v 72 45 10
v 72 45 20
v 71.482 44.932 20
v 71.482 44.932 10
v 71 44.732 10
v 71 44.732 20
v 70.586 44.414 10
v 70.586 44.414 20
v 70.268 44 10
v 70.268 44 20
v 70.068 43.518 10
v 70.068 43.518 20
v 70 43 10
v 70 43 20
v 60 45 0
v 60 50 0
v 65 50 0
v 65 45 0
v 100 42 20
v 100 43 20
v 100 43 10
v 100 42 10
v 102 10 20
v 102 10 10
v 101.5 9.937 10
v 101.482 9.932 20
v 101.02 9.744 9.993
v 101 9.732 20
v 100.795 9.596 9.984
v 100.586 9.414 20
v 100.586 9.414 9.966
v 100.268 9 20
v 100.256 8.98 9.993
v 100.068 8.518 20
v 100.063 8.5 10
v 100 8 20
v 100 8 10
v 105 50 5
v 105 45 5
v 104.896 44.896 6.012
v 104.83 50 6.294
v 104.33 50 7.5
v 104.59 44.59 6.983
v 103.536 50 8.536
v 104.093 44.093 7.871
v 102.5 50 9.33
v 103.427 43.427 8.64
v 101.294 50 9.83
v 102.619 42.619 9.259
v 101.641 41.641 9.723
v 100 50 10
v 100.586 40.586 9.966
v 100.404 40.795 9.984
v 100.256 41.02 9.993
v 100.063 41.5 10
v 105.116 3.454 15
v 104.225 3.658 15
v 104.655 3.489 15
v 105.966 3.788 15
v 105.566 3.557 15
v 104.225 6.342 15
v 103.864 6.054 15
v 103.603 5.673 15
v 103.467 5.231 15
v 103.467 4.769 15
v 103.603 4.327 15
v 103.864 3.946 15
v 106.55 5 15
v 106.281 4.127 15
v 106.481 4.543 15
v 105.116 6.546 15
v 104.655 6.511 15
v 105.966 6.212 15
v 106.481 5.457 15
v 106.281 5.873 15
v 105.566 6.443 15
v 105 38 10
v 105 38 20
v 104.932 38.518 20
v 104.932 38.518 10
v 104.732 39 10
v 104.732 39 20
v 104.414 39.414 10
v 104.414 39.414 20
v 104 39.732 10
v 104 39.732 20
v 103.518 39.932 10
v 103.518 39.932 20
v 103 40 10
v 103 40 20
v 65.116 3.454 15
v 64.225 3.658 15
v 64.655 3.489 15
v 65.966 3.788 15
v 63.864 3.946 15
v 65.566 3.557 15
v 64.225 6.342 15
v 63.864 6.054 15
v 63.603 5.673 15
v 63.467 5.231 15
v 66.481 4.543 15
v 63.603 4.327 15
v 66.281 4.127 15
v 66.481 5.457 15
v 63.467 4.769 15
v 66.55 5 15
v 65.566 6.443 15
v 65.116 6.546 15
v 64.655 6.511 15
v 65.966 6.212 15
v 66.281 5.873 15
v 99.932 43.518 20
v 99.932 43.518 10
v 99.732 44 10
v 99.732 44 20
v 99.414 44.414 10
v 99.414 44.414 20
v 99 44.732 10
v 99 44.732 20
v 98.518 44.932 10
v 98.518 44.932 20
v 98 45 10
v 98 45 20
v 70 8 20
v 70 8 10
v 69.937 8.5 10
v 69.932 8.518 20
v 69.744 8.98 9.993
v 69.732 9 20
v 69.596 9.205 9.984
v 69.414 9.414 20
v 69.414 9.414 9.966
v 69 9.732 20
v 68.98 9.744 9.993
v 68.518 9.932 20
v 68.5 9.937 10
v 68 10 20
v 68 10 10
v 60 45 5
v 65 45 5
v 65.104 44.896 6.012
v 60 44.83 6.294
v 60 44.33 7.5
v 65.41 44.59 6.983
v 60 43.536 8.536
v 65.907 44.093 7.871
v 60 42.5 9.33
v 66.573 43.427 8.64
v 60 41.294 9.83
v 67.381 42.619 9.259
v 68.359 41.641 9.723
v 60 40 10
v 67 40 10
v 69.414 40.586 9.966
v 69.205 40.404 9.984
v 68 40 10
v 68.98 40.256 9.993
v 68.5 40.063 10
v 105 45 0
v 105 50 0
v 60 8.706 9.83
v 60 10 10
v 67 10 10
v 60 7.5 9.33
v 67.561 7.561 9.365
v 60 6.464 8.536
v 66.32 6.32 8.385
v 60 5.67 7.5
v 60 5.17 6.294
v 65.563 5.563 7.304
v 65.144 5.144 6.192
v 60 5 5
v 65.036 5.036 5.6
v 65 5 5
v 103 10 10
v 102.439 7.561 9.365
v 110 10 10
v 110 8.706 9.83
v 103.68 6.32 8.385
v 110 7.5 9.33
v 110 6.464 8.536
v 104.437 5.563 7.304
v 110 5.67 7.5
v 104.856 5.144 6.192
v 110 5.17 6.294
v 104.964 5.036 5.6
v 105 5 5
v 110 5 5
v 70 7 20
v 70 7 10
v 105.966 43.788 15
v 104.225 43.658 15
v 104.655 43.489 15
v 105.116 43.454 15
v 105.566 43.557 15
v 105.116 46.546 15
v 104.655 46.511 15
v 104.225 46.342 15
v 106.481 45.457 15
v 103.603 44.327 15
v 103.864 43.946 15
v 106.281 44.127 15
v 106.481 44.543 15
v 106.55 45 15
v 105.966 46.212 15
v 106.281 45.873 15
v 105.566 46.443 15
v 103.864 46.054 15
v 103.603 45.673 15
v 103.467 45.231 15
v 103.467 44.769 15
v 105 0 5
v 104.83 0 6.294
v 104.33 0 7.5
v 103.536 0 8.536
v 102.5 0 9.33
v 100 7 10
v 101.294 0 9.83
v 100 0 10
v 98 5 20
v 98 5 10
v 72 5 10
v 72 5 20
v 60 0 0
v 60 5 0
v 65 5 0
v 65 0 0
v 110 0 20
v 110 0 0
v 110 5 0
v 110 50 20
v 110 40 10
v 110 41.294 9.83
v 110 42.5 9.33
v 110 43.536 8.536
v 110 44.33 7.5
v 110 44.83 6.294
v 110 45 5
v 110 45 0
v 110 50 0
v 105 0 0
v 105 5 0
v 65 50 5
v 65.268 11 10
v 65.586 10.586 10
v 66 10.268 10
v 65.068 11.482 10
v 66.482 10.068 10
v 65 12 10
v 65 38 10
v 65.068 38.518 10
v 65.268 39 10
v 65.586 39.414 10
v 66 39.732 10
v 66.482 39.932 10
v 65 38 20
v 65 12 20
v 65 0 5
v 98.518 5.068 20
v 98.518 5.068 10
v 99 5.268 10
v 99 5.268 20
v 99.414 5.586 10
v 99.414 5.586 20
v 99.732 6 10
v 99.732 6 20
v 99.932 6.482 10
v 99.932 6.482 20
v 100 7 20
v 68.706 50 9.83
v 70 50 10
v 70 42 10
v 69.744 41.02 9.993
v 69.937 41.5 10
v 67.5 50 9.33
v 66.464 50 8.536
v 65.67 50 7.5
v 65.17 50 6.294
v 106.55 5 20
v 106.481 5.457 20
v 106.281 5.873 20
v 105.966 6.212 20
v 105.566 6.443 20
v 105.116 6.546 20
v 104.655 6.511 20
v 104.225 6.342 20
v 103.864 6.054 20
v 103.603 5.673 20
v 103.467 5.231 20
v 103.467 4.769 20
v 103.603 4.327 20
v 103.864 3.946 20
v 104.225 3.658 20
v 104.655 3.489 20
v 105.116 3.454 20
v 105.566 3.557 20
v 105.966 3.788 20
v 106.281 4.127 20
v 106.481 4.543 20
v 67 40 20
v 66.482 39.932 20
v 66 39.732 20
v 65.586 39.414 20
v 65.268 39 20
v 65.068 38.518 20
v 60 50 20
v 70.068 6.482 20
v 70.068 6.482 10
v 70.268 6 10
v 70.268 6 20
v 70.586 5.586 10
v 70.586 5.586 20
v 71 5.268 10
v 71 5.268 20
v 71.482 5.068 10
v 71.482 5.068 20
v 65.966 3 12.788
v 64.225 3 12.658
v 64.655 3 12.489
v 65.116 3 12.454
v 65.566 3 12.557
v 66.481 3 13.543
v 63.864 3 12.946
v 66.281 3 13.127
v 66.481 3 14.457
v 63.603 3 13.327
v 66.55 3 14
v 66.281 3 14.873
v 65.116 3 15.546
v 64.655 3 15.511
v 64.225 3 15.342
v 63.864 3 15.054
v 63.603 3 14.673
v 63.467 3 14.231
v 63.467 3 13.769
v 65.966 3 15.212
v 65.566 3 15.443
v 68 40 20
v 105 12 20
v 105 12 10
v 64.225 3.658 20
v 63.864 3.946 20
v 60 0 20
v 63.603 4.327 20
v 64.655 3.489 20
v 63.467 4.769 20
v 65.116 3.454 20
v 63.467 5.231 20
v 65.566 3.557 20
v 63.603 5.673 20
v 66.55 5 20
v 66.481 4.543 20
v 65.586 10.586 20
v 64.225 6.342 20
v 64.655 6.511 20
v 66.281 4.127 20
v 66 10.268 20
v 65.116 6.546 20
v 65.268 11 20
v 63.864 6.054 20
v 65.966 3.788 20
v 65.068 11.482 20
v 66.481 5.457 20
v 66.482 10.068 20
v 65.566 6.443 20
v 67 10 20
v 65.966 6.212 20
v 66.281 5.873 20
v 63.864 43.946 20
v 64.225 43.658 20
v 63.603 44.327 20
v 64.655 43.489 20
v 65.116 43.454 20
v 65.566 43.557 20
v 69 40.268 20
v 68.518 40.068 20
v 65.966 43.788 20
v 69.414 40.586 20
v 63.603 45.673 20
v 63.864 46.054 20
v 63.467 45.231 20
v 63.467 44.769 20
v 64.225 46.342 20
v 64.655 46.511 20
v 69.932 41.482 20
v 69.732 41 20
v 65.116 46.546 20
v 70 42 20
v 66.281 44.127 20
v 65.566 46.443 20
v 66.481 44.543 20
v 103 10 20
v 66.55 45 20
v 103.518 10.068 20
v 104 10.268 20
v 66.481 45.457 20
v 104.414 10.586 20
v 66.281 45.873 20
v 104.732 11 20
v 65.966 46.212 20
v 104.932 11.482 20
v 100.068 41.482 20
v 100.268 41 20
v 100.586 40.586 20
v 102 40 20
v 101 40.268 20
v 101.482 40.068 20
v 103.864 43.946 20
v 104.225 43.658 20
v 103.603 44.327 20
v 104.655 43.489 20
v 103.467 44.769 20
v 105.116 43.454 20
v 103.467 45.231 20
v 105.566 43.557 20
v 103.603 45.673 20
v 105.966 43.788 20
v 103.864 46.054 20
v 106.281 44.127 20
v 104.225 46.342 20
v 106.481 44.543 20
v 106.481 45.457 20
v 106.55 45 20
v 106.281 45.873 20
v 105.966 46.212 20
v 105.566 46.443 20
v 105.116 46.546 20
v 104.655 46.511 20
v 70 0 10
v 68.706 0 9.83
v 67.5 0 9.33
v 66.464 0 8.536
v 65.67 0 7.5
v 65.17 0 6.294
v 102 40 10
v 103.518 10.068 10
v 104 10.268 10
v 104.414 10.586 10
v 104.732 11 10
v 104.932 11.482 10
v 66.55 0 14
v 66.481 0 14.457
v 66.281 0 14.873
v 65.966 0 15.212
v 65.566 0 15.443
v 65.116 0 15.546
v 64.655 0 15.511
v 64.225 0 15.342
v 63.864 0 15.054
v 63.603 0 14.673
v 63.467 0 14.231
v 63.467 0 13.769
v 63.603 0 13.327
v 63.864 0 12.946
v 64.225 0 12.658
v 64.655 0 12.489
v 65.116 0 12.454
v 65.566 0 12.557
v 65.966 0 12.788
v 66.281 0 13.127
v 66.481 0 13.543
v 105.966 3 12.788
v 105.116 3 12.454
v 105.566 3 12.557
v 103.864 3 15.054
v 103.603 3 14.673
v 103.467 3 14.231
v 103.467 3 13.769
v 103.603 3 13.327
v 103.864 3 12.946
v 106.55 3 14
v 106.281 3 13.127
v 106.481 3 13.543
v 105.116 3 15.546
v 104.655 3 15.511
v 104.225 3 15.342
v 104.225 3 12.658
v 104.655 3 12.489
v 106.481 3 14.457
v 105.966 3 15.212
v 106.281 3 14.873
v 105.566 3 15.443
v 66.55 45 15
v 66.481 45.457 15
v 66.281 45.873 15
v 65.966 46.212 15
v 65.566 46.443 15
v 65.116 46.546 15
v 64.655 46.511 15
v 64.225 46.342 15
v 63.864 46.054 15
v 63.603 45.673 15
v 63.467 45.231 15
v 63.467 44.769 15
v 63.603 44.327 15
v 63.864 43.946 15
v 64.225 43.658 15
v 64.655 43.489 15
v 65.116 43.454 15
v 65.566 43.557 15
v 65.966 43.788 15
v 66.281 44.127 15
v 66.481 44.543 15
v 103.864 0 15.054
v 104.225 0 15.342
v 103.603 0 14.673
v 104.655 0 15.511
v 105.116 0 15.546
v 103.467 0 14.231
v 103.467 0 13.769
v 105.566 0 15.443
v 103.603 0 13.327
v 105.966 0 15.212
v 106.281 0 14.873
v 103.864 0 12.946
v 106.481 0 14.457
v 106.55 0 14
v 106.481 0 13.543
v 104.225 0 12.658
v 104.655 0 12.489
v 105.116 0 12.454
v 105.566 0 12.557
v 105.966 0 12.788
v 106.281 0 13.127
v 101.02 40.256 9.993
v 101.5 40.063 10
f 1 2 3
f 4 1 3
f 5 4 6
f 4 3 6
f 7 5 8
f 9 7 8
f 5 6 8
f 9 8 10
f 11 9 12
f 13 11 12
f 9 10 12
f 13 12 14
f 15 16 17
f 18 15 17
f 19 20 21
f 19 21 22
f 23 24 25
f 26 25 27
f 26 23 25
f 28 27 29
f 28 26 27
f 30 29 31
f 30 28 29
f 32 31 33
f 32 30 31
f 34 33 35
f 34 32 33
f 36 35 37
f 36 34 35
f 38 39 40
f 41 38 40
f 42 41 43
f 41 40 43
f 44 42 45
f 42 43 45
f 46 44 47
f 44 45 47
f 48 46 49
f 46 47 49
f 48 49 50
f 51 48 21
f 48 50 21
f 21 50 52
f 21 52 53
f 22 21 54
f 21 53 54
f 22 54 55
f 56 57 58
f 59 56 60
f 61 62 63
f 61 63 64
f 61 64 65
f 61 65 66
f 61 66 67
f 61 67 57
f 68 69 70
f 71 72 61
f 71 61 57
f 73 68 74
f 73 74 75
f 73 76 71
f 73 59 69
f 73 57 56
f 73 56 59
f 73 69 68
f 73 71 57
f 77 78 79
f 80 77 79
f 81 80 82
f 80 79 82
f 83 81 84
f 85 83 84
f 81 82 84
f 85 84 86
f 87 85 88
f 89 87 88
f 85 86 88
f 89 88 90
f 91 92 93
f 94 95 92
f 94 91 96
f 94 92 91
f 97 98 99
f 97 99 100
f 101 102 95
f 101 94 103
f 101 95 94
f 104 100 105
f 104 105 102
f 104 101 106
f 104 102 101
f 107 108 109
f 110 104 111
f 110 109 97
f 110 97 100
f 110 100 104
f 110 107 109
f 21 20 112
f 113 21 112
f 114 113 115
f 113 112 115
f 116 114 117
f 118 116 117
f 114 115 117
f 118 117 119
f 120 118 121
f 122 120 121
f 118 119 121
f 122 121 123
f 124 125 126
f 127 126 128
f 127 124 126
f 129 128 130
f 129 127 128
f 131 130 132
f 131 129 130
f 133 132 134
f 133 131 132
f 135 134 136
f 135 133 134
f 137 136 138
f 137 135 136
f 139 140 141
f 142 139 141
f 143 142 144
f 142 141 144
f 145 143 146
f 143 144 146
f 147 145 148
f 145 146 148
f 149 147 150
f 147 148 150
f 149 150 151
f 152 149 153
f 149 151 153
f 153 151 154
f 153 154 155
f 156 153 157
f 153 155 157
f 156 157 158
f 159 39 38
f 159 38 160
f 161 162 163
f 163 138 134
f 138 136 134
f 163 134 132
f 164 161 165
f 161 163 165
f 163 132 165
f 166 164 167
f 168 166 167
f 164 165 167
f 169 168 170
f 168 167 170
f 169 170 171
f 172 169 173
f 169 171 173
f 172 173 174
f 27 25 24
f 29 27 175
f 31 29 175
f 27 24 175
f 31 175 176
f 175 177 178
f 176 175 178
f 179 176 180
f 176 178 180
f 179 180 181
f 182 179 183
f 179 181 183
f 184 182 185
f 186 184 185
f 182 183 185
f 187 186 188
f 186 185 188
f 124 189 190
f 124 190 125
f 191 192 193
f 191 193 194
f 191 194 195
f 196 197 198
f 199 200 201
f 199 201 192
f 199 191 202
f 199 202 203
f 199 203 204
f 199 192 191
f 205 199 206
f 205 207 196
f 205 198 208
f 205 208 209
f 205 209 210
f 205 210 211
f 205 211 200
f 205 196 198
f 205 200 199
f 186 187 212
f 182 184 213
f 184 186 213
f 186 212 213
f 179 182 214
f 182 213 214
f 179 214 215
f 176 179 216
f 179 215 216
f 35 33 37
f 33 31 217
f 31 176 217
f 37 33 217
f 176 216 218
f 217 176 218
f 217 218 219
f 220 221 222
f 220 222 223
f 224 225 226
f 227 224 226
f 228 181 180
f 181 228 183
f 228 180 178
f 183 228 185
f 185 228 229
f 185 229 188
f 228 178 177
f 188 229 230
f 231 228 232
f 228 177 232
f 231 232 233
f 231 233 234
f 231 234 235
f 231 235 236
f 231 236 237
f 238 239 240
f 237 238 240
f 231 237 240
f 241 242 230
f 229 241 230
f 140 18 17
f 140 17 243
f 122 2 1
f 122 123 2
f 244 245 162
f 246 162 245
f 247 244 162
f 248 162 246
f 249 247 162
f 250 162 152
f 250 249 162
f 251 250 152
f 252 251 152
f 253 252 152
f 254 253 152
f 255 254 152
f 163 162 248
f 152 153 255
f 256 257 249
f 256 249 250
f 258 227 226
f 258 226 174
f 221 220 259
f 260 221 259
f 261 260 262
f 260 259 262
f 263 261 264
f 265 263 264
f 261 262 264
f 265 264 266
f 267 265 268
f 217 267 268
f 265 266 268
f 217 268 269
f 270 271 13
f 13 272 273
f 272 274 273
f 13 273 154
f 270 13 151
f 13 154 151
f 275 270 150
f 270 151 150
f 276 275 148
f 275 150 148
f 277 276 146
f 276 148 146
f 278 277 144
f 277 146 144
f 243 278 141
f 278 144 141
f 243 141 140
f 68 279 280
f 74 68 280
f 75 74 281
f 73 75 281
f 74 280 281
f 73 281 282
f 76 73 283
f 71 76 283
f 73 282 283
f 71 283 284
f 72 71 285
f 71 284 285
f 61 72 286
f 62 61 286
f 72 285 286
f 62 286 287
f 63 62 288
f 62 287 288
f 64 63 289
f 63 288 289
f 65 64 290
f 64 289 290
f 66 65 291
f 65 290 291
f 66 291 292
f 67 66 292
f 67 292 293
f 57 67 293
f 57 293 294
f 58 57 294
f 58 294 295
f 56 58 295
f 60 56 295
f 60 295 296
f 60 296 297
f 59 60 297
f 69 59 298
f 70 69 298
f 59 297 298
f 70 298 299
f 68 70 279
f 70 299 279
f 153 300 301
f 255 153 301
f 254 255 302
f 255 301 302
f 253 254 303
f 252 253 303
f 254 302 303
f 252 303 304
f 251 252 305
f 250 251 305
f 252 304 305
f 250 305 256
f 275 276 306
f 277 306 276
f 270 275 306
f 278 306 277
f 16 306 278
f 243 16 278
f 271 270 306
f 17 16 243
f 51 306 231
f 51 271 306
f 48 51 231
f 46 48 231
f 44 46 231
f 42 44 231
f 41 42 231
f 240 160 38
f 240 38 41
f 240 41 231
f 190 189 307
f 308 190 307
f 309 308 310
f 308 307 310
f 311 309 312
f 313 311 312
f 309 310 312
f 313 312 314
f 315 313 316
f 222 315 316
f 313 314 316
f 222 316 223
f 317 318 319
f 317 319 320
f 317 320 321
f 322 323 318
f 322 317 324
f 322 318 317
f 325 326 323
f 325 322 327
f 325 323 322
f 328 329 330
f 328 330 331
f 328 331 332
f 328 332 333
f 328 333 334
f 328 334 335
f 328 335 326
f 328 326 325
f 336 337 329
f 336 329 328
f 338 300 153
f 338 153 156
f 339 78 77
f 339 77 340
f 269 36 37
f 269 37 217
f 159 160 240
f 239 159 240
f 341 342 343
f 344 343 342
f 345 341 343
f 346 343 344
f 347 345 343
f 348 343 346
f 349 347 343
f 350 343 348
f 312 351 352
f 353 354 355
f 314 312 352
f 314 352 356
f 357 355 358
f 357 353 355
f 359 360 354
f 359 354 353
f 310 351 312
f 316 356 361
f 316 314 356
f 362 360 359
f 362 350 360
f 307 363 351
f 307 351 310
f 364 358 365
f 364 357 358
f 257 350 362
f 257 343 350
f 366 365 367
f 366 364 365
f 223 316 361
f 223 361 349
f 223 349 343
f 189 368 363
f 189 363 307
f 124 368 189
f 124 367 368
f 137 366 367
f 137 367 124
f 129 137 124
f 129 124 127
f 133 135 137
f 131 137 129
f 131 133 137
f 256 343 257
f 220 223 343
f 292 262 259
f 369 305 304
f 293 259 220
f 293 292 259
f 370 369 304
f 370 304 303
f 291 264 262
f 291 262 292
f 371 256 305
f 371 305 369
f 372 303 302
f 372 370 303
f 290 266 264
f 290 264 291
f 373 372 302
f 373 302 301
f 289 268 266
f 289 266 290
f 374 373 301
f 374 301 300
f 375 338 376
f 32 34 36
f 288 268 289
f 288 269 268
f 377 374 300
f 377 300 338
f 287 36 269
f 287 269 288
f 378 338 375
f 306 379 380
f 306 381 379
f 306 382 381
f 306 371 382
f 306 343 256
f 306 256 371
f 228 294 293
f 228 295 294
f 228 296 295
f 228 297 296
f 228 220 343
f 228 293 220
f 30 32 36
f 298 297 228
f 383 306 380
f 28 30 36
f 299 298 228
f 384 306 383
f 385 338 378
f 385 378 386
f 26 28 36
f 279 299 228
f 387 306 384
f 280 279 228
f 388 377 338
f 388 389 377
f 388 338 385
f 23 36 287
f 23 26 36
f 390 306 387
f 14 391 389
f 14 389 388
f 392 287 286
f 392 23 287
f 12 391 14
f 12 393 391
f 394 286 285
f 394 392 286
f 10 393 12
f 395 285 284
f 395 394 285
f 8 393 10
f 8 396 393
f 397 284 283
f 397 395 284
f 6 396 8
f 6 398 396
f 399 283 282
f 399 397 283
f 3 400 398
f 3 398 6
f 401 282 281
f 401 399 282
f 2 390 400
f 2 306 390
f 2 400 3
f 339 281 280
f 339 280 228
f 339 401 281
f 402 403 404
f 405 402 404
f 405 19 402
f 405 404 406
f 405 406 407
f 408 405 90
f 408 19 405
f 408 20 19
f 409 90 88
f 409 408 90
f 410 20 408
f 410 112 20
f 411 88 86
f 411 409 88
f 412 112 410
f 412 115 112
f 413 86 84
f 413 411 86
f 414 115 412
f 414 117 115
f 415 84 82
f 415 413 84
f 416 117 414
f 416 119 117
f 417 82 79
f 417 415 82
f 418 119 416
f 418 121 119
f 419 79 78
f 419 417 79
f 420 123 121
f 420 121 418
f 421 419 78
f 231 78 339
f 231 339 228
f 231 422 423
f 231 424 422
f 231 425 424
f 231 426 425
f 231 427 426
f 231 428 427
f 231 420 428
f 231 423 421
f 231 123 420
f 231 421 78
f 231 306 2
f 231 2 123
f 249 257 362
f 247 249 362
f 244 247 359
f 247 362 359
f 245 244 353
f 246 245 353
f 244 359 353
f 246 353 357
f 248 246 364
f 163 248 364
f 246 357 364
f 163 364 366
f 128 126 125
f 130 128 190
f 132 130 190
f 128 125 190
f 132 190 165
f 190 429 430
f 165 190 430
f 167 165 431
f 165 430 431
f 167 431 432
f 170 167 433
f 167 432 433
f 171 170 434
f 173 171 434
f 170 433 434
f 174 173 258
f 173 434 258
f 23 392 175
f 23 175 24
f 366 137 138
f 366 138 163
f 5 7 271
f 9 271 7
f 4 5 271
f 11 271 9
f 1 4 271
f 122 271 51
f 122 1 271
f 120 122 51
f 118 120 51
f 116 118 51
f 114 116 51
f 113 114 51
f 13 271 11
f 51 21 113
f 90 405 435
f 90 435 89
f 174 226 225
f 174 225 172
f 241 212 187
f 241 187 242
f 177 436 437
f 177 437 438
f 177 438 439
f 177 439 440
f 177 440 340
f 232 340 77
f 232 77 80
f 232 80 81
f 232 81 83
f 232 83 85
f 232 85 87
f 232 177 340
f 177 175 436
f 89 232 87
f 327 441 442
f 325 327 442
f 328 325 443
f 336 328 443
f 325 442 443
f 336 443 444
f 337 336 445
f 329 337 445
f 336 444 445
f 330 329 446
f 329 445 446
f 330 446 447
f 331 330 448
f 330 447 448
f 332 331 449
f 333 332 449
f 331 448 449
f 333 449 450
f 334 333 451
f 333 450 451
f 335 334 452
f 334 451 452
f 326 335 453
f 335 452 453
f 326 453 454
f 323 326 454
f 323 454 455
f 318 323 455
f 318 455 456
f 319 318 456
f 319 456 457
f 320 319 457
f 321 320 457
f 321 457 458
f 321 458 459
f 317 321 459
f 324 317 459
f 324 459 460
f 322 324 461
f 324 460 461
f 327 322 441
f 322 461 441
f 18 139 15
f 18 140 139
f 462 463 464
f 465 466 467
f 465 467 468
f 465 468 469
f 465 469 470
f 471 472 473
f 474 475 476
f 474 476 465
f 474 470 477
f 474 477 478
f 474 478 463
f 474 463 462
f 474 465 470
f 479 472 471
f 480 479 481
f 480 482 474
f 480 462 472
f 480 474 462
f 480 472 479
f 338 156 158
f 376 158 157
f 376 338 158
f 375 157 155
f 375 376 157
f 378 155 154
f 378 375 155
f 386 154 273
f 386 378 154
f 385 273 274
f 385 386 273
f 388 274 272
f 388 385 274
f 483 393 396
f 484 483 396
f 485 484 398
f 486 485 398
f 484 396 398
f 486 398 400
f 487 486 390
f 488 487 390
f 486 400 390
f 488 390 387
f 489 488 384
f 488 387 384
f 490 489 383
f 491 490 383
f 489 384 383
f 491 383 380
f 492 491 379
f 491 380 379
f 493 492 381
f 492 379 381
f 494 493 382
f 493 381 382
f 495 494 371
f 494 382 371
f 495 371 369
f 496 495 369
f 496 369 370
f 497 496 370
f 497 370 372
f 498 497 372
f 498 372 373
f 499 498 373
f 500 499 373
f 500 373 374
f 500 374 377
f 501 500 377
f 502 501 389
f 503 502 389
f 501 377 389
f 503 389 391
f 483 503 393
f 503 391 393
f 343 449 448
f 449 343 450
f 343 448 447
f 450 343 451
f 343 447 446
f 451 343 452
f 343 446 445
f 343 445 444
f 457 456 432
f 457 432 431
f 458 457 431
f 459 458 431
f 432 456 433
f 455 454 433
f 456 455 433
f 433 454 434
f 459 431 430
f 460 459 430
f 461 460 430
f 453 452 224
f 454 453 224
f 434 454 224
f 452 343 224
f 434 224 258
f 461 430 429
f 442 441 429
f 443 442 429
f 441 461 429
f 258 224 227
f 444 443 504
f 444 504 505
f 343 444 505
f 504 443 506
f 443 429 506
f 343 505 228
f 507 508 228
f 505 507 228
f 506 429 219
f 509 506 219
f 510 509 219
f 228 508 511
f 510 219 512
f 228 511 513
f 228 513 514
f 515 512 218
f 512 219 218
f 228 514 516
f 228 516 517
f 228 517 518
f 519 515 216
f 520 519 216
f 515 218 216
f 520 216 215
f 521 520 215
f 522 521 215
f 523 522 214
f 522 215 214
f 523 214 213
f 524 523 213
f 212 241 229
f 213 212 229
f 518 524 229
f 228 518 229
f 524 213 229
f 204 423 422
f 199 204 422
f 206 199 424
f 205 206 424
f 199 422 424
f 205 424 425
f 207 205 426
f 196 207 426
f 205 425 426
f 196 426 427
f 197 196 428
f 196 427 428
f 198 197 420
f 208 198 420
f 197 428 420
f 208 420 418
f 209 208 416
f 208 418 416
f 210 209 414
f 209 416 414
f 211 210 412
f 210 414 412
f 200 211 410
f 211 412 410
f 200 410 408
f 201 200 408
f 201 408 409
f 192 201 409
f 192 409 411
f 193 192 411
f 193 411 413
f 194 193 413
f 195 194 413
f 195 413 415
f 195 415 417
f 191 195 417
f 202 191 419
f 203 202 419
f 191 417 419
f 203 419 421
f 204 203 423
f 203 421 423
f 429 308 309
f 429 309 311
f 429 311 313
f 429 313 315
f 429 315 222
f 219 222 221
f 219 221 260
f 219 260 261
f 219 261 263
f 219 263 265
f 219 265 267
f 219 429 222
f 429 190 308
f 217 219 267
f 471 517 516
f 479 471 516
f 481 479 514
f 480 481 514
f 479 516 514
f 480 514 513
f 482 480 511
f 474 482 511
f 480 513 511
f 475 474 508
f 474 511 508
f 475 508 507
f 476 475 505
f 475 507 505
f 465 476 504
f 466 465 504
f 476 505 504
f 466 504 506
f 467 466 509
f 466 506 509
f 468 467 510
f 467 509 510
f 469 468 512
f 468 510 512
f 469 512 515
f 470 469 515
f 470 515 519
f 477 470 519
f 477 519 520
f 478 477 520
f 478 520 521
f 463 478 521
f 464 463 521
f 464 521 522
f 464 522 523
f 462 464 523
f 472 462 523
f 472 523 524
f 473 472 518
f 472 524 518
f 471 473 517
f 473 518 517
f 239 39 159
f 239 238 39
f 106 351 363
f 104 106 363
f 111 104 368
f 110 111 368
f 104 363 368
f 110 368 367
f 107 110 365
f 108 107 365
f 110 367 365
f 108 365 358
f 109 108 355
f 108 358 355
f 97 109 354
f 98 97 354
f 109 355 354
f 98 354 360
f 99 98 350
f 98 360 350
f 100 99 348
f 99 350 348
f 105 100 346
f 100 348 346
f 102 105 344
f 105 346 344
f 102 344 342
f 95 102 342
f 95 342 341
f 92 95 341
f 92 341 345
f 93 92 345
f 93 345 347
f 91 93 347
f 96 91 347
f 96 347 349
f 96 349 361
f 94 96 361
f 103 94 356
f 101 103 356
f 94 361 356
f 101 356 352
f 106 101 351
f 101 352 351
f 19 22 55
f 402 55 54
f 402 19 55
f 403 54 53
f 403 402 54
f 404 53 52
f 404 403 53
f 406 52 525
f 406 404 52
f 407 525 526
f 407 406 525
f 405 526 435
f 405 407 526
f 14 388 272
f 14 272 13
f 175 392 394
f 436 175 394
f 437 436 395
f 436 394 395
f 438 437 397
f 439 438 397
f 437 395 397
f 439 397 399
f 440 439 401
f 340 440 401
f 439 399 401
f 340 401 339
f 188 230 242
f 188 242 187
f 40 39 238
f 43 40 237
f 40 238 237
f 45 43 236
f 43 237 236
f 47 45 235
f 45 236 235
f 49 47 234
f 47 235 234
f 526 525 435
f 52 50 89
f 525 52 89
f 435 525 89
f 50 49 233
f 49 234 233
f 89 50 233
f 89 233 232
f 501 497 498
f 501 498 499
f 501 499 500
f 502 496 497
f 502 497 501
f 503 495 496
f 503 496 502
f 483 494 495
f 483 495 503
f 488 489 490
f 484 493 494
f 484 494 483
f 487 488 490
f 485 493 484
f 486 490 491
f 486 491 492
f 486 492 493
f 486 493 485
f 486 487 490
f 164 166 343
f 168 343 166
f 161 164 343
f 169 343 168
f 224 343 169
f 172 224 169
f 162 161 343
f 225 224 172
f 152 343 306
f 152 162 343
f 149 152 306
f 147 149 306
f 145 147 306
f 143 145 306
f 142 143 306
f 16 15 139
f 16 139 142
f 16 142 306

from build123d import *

# Parameters (mm, degrees)
SKETCH152_W     = 50
SKETCH152_H     = 50
PAD026_DEPTH    = 20
POCKET127_DEPTH = 20.001
POCKET128_DEPTH = 50.001
POCKET129_DEPTH = 50.001
SKETCH156_R     = 1.55
POCKET130_DEPTH = 5
SKETCH157_R     = 1.55
POCKET131_DEPTH = 3


with BuildPart() as part:
    # Sketch152 → Pad026 (new body)
    with BuildSketch(Plane.XY):
        Rectangle(SKETCH152_W, SKETCH152_H)
    extrude(amount=PAD026_DEPTH)

    # Sketch153 (on Face6 of Pad026) → Pocket127 (cut, through all)
    with BuildSketch(Plane.XY.offset(20)):
        with BuildLine():
            Line((-18, 15), (-17, 15))
            ThreePointArc((-17, 15), (-15.585786, 15.585786), (-15, 17))
            Line((-15, 17), (-15, 18))
            ThreePointArc((-13, 20), (-14.414214, 19.414214), (-15, 18))
            Line((-13, 20), (13, 20))
            ThreePointArc((15, 18), (14.414214, 19.414214), (13, 20))
            Line((15, 18), (15, 17))
            ThreePointArc((15, 17), (15.585786, 15.585786), (17, 15))
            Line((17, 15), (18, 15))
            ThreePointArc((20, 13), (19.414214, 14.414214), (18, 15))
            Line((20, 13), (20, -13))
            ThreePointArc((18, -15), (19.414214, -14.414214), (20, -13))
            Line((18, -15), (17, -15))
            ThreePointArc((17, -15), (15.585786, -15.585786), (15, -17))
            Line((15, -17), (15, -18))
            ThreePointArc((13, -20), (14.414214, -19.414214), (15, -18))
            Line((13, -20), (-13, -20))
            ThreePointArc((-15, -18), (-14.414214, -19.414214), (-13, -20))
            Line((-15, -18), (-15, -17))
            ThreePointArc((-15, -17), (-15.585786, -15.585786), (-17, -15))
            Line((-17, -15), (-18, -15))
            ThreePointArc((-20, -13), (-19.414214, -14.414214), (-18, -15))
            Line((-20, -13), (-20, 13))
            ThreePointArc((-18, 15), (-19.414214, 14.414214), (-20, 13))
        make_face()
    extrude(amount=-POCKET127_DEPTH, mode=Mode.SUBTRACT)

    # Sketch154 (on Face3 of Pocket127) → Pocket128 (cut, through all)
    with BuildSketch(Plane.YZ.offset(25)):
        with BuildLine():
            Line((-15, 10), (15, 10))
            ThreePointArc((20, 5), (18.535534, 8.535534), (15, 10))
            Line((20, 5), (20, 0))
            Line((20, 0), (-20, 0))
            Line((-20, 0), (-20, 5))
            ThreePointArc((-15, 10), (-18.535534, 8.535534), (-20, 5))
        make_face()
    extrude(amount=-POCKET128_DEPTH, mode=Mode.SUBTRACT)

    # Sketch155 (on Face6 of Pocket127) → Pocket129 (cut, through all)
    with BuildSketch(Plane.XZ.offset(25)):
        with BuildLine():
            Line((-15, 10), (15, 10))
            ThreePointArc((20, 5), (18.535534, 8.535534), (15, 10))
            Line((20, 5), (20, 0))
            Line((20, 0), (-20, 0))
            Line((-20, 0), (-20, 5))
            ThreePointArc((-15, 10), (-18.535534, 8.535534), (-20, 5))
        make_face()
    extrude(amount=-POCKET129_DEPTH, mode=Mode.SUBTRACT)

    # Sketch156 → Pocket130 (cut)
    with BuildSketch(Plane.XY.offset(20)):
        with Locations((-20, 20)):
            Circle(SKETCH156_R)
        with Locations((20, 20)):
            Circle(SKETCH156_R)
        with Locations((20, -20)):
            Circle(SKETCH156_R)
        with Locations((-20, -20)):
            Circle(SKETCH156_R)
    extrude(amount=-POCKET130_DEPTH, mode=Mode.SUBTRACT)

    # Sketch157 (on Face27 of Pocket130) → Pocket131 (cut)
    with BuildSketch(Plane.XZ.offset(25)):
        with Locations((-20, 14)):
            Circle(SKETCH157_R)
        with Locations((20, 14)):
            Circle(SKETCH157_R)
    extrude(amount=-POCKET131_DEPTH, mode=Mode.SUBTRACT)


with BuildPart() as part_1:
    # Body027 placement: moved
    add(part.part.moved(Location((85, 25, 0))))


solid = part_1.part
